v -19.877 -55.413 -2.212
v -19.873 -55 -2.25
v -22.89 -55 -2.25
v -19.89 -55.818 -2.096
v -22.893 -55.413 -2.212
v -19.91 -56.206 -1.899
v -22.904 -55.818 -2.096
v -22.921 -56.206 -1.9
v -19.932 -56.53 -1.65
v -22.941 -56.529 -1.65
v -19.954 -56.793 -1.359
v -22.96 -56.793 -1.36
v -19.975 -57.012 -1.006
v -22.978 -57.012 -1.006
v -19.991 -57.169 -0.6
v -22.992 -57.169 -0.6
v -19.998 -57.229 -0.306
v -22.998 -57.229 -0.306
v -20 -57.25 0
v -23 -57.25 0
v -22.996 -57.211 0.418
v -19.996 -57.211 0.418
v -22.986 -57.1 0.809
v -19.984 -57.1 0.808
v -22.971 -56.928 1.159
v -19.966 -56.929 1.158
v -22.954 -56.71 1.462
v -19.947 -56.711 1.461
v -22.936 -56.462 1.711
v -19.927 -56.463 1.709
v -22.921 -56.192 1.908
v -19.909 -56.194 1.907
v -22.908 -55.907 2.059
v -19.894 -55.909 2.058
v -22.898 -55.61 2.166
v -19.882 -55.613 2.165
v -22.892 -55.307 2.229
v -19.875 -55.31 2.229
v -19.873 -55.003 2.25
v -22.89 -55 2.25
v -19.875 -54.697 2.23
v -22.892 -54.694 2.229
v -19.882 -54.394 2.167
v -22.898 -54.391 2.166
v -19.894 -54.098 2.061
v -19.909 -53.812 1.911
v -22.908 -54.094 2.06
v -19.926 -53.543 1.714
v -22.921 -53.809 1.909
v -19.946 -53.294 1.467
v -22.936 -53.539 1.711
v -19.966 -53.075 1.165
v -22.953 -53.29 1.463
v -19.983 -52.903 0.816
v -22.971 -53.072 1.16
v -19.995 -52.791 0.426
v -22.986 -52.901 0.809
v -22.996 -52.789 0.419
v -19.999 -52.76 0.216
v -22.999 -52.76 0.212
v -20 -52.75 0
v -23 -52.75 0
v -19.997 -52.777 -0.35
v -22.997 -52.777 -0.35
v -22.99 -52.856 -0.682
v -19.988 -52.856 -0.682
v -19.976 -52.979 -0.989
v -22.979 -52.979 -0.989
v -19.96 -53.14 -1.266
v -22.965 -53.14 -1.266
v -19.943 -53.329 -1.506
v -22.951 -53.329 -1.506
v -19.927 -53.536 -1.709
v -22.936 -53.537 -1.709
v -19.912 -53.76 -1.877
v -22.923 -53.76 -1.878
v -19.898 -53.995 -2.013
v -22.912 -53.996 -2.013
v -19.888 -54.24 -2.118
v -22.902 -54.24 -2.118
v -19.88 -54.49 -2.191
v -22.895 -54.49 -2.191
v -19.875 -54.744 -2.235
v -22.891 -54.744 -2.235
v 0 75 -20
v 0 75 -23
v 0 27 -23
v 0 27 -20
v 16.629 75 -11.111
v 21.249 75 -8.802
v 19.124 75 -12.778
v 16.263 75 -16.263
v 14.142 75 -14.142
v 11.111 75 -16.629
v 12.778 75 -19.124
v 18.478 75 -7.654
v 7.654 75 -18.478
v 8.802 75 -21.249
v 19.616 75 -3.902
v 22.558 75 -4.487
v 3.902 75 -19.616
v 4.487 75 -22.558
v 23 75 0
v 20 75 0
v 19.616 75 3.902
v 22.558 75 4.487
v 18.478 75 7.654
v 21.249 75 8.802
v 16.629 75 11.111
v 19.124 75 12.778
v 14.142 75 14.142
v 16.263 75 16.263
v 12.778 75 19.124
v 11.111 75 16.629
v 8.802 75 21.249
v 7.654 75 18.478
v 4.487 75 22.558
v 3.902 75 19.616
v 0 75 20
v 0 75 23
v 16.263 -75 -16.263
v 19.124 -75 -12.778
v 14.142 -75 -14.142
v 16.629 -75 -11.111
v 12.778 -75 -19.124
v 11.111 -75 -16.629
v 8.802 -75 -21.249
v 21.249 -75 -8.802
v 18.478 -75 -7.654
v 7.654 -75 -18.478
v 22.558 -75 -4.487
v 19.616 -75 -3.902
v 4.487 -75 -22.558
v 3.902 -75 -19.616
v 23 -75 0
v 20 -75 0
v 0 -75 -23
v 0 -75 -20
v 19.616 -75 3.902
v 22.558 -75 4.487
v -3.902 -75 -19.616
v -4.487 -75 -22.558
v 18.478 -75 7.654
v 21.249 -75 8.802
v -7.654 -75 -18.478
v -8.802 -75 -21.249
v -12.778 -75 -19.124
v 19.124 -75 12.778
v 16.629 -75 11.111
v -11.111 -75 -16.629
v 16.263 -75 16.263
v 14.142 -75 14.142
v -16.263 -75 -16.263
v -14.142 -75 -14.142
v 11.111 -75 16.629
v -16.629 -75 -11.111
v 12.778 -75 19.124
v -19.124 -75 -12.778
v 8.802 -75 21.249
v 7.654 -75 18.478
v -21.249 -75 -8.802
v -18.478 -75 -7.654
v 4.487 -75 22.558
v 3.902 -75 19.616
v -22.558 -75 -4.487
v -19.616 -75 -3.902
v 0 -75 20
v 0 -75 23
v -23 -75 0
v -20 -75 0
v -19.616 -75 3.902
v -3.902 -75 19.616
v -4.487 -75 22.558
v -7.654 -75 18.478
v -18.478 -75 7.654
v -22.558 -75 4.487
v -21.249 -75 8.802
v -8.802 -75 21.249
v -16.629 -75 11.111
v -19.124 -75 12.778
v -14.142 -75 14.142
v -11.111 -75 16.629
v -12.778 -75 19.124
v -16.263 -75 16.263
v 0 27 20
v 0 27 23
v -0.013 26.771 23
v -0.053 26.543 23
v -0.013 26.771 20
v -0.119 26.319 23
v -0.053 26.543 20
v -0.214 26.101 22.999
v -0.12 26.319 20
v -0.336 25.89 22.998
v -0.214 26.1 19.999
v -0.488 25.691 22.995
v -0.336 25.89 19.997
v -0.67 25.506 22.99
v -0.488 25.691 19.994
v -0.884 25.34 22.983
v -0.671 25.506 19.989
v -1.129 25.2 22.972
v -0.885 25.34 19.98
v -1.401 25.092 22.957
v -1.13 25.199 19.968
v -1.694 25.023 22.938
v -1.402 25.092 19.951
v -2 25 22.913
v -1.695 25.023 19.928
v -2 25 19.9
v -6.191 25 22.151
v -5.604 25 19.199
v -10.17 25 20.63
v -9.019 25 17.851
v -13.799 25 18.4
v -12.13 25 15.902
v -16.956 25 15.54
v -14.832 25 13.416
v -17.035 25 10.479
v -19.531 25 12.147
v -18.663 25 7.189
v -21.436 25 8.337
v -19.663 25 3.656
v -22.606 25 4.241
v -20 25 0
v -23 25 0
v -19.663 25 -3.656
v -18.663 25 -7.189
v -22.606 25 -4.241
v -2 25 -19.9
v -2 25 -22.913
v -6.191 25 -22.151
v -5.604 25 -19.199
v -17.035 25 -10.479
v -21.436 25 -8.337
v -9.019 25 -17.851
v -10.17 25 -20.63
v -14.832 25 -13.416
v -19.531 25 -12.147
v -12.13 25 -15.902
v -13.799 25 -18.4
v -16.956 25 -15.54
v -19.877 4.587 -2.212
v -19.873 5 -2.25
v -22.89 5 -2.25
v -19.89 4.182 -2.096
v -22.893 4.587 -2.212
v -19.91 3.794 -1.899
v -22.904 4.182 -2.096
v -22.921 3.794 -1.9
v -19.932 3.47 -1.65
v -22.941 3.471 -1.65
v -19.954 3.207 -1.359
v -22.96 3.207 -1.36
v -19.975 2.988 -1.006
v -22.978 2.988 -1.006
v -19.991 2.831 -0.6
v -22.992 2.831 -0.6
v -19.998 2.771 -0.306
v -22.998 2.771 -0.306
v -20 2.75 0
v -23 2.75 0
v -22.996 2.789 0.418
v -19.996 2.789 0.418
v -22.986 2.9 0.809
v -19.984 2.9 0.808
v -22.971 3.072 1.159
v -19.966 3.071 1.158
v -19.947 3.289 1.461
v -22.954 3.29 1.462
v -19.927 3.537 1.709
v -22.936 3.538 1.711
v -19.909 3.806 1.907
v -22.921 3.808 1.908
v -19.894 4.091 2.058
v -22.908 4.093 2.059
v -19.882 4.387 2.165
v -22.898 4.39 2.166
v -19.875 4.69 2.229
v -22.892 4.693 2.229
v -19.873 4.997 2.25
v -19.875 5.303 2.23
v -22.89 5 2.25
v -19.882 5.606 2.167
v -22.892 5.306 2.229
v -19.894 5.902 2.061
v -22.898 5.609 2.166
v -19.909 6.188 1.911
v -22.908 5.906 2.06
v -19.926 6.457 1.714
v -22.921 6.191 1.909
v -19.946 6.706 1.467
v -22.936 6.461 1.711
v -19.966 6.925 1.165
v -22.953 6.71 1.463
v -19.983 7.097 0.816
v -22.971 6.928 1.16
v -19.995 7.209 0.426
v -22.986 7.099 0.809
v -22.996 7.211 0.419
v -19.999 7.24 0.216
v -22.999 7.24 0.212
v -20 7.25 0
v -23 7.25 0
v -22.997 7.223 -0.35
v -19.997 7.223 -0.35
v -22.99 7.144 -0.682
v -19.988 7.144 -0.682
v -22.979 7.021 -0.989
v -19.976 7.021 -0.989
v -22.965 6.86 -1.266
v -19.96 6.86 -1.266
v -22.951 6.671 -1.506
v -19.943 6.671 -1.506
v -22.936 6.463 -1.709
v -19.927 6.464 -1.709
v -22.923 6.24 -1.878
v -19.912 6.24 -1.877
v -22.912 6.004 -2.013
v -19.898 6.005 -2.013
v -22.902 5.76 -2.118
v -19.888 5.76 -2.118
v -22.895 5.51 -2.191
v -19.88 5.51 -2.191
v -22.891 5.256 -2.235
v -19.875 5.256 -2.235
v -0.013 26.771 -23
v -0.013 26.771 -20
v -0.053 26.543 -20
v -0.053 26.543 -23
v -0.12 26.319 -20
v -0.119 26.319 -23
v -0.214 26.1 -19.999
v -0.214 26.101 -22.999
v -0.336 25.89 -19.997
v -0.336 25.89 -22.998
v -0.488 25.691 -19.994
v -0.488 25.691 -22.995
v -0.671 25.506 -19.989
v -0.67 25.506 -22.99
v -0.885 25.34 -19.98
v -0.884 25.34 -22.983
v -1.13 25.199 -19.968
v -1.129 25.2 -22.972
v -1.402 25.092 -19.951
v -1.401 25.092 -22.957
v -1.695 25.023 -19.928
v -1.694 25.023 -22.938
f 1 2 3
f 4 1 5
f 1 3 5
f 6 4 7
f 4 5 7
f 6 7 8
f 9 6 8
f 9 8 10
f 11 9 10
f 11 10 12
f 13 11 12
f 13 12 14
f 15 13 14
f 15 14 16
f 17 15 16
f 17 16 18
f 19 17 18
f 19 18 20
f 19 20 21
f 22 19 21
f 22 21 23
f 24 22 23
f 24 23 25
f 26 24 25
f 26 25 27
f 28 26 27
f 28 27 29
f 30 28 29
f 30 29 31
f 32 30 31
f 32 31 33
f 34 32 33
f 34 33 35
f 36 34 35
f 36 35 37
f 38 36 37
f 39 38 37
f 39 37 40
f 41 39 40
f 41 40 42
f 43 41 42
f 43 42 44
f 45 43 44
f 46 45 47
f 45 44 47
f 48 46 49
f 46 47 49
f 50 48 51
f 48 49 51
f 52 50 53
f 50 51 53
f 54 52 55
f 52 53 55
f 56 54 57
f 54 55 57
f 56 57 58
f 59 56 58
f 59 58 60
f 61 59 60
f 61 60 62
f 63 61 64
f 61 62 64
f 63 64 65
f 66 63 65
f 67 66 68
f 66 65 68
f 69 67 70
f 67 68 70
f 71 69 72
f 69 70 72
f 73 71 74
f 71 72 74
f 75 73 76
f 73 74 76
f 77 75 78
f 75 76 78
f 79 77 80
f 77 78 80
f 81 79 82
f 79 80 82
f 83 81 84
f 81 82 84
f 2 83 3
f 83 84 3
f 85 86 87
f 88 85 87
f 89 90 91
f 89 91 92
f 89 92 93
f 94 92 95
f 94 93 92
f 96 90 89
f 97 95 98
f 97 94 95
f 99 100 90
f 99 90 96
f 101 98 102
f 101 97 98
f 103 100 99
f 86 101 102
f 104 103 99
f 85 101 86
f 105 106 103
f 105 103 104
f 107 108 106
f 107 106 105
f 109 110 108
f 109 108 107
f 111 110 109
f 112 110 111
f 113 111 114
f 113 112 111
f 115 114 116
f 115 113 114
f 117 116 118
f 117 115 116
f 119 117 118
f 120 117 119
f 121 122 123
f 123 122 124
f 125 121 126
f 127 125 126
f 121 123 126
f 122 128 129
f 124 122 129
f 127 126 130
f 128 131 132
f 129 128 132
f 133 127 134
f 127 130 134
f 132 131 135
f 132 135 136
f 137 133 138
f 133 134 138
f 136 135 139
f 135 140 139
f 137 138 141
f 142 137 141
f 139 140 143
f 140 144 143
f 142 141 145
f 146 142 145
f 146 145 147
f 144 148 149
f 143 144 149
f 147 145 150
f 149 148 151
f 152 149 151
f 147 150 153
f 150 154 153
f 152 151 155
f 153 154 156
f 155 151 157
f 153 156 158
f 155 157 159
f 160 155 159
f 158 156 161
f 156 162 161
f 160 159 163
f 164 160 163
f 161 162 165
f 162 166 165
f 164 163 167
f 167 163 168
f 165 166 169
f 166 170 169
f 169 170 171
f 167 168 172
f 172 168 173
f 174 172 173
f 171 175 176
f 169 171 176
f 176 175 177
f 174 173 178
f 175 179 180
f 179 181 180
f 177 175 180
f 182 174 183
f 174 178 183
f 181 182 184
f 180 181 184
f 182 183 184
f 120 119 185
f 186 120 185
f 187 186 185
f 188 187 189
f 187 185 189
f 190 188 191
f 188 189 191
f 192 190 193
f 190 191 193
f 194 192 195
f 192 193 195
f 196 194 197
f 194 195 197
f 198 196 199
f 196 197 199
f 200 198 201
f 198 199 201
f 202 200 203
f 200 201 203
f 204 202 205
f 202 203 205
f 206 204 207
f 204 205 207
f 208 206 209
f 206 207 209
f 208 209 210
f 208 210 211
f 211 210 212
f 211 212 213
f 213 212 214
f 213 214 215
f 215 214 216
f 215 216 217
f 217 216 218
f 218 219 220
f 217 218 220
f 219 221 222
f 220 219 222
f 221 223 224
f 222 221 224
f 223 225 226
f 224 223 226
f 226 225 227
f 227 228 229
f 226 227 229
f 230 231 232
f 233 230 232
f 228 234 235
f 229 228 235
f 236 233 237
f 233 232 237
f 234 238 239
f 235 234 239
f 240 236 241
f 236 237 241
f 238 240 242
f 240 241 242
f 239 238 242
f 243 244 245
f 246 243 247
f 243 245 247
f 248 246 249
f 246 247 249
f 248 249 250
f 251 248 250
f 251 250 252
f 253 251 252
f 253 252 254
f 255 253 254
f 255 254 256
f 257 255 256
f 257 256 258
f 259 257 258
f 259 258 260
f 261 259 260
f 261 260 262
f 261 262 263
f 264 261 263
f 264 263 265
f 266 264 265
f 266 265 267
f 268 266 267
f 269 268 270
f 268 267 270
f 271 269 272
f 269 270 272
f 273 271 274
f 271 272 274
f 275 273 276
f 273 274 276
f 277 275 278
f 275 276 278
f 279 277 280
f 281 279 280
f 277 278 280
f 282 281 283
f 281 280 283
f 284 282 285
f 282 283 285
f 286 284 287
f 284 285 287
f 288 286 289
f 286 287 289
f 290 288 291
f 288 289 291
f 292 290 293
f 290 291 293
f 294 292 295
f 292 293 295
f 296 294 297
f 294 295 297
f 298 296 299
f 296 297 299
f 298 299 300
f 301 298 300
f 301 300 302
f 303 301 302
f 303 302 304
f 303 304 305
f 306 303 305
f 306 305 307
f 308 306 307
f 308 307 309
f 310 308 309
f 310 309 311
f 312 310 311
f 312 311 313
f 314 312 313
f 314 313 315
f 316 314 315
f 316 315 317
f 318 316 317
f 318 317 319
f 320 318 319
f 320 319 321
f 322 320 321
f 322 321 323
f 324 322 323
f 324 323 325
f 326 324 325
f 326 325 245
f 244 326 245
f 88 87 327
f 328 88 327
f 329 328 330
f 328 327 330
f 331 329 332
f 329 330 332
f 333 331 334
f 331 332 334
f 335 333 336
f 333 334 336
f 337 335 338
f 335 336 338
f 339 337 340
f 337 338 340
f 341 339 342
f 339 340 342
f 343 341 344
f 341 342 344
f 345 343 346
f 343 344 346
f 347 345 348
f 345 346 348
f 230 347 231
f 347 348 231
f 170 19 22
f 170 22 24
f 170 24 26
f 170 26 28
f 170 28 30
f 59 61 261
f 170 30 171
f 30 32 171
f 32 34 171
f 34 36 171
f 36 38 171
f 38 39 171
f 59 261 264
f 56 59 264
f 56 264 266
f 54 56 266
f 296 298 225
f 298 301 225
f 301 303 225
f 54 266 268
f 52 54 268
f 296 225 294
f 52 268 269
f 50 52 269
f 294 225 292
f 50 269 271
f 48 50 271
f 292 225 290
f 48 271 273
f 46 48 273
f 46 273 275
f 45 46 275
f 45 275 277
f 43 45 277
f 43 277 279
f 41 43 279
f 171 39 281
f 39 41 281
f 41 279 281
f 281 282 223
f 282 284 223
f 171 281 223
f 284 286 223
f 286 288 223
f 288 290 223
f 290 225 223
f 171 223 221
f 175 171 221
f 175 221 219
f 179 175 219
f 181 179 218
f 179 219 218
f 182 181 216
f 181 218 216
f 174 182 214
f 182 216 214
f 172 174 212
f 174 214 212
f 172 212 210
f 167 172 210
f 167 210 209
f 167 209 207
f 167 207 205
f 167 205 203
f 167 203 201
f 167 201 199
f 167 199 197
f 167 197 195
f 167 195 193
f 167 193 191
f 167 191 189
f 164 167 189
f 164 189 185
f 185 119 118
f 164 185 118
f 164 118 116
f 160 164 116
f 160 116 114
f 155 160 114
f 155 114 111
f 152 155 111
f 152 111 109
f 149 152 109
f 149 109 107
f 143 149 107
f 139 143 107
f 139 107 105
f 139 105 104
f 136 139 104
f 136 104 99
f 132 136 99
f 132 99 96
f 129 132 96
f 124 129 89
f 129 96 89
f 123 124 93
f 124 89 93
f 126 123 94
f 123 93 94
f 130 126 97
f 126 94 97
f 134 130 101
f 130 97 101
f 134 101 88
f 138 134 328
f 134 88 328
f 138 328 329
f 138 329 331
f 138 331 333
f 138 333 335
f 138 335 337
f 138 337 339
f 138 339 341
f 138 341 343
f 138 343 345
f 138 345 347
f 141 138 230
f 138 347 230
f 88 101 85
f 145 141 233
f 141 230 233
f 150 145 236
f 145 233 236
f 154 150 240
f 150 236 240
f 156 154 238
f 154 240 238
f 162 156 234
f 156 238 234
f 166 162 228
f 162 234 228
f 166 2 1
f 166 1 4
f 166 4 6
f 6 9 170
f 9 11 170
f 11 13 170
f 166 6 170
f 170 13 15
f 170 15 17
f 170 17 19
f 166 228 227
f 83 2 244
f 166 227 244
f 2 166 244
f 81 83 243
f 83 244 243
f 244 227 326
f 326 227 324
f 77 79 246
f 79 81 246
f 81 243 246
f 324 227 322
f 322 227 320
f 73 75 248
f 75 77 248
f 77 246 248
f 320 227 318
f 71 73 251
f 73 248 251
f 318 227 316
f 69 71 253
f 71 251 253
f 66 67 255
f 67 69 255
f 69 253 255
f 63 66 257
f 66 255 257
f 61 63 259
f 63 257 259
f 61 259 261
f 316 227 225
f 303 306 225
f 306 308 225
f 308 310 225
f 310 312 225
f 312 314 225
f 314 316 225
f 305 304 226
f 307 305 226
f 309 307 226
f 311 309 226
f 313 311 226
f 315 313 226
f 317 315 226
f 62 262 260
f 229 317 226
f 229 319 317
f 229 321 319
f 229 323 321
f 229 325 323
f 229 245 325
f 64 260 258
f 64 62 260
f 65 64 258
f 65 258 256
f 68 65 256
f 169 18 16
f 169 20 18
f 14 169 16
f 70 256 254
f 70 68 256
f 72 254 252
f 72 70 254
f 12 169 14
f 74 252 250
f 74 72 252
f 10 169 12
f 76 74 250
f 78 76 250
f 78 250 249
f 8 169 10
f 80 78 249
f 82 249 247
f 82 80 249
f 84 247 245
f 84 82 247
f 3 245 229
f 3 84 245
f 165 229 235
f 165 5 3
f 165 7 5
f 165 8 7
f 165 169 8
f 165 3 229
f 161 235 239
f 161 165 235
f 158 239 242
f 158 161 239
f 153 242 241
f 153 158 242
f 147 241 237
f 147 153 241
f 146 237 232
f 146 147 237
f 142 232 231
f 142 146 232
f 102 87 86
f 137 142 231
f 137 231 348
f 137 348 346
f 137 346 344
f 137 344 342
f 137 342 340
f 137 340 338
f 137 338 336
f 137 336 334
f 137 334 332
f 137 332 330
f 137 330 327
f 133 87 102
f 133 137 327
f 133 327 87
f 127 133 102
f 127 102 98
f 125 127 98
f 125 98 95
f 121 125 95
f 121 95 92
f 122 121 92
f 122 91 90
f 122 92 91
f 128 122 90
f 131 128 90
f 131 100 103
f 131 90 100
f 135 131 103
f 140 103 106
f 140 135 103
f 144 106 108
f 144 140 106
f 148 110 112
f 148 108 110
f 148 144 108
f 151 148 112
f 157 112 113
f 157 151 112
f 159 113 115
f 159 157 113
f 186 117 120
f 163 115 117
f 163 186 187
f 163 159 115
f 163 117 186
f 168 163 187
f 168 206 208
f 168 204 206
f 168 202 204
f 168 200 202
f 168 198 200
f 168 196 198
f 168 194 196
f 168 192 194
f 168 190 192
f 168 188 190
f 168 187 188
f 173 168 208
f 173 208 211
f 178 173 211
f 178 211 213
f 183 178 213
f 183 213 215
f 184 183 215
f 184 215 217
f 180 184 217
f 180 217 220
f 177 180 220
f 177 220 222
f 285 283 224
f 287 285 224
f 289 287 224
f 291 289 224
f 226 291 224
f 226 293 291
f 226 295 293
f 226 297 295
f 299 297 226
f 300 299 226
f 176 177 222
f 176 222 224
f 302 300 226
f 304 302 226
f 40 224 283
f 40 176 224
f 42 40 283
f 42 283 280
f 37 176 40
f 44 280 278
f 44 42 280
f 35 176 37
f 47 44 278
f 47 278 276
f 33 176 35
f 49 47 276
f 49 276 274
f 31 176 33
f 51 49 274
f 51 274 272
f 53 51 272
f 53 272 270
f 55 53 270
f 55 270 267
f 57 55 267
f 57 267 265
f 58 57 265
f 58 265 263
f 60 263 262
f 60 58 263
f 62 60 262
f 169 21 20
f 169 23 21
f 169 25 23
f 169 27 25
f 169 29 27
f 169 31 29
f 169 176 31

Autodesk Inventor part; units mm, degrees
ref_plane "YZ Plane" through (0, 0, 0) normal (1, 0, 0) x (0, 1, 0)
ref_plane "XZ Plane" through (0, 0, 0) normal (0, 1, 0) x (-1, 0, 0)
ref_plane "XY Plane" through (0, 0, 0) normal (0, 0, 1) x (1, 0, 0)
sketch "Sketch1" plane through (0, 0, 0) normal (0, 1, 0) x (-1, 0, 0)
  circle A0 centre (0, 0) radius 20
  circle A1 centre (0, 0) radius 23
  dimension "d0" = 40
  dimension "d1" = 3
extrude "Extrusion1" add sketch "Sketch1" along normal mid plane 150
sketch "Sketch2" plane through (0, 0, 0) normal (1, 0, 0) x (0, 1, 0)
  line L0 (-105, 0) -> (105, 0) projected
  line L1 (-75, 23) -> (-75, -23) projected
  point P0 (0, 0)
  point P1 (5, 0)
  point P2 (-55, 0)
  dimension "d4" = 60
  dimension "d5" = 20
hole "Hole1" at (0, 5, 0) at (0, -55, 0) direction (-1, 0, 0) diameter 4.5 end through all clearance for "Socket Head Cap Screw" size "M4" standard "Ansi Metric M Profile"
sketch "Sketch3" plane through (0, 0, 0) normal (0, 0, 1) x (1, 0, 0)
  line L0 (23, 75) -> (-23, 75) projected
  line L1 (-23, -75) -> (-23, 75) projected
  line L2 (-23, 75) -> (0, 75)
  line L3 (0, 75) -> (0, 25)
  line L4 (0, 25) -> (-23, 25)
  line L5 (-23, 25) -> (-23, 75)
  point P0 (0, 0)
  dimension "d13" = 50
  dimension "d14" = 23
  dimension "d15" = 46
extrude "Extrusion2" cut sketch "Sketch3" along normal through all both and the other way through all
fillet "Fillet1" radius 2 2 edges at (0, 25, 21.5) (0, 25, -21.5)
equation "\"d14\" = 0.5 * d15"
properties part number "Pancake_Lower Pipe" material "PVC-Piping"
